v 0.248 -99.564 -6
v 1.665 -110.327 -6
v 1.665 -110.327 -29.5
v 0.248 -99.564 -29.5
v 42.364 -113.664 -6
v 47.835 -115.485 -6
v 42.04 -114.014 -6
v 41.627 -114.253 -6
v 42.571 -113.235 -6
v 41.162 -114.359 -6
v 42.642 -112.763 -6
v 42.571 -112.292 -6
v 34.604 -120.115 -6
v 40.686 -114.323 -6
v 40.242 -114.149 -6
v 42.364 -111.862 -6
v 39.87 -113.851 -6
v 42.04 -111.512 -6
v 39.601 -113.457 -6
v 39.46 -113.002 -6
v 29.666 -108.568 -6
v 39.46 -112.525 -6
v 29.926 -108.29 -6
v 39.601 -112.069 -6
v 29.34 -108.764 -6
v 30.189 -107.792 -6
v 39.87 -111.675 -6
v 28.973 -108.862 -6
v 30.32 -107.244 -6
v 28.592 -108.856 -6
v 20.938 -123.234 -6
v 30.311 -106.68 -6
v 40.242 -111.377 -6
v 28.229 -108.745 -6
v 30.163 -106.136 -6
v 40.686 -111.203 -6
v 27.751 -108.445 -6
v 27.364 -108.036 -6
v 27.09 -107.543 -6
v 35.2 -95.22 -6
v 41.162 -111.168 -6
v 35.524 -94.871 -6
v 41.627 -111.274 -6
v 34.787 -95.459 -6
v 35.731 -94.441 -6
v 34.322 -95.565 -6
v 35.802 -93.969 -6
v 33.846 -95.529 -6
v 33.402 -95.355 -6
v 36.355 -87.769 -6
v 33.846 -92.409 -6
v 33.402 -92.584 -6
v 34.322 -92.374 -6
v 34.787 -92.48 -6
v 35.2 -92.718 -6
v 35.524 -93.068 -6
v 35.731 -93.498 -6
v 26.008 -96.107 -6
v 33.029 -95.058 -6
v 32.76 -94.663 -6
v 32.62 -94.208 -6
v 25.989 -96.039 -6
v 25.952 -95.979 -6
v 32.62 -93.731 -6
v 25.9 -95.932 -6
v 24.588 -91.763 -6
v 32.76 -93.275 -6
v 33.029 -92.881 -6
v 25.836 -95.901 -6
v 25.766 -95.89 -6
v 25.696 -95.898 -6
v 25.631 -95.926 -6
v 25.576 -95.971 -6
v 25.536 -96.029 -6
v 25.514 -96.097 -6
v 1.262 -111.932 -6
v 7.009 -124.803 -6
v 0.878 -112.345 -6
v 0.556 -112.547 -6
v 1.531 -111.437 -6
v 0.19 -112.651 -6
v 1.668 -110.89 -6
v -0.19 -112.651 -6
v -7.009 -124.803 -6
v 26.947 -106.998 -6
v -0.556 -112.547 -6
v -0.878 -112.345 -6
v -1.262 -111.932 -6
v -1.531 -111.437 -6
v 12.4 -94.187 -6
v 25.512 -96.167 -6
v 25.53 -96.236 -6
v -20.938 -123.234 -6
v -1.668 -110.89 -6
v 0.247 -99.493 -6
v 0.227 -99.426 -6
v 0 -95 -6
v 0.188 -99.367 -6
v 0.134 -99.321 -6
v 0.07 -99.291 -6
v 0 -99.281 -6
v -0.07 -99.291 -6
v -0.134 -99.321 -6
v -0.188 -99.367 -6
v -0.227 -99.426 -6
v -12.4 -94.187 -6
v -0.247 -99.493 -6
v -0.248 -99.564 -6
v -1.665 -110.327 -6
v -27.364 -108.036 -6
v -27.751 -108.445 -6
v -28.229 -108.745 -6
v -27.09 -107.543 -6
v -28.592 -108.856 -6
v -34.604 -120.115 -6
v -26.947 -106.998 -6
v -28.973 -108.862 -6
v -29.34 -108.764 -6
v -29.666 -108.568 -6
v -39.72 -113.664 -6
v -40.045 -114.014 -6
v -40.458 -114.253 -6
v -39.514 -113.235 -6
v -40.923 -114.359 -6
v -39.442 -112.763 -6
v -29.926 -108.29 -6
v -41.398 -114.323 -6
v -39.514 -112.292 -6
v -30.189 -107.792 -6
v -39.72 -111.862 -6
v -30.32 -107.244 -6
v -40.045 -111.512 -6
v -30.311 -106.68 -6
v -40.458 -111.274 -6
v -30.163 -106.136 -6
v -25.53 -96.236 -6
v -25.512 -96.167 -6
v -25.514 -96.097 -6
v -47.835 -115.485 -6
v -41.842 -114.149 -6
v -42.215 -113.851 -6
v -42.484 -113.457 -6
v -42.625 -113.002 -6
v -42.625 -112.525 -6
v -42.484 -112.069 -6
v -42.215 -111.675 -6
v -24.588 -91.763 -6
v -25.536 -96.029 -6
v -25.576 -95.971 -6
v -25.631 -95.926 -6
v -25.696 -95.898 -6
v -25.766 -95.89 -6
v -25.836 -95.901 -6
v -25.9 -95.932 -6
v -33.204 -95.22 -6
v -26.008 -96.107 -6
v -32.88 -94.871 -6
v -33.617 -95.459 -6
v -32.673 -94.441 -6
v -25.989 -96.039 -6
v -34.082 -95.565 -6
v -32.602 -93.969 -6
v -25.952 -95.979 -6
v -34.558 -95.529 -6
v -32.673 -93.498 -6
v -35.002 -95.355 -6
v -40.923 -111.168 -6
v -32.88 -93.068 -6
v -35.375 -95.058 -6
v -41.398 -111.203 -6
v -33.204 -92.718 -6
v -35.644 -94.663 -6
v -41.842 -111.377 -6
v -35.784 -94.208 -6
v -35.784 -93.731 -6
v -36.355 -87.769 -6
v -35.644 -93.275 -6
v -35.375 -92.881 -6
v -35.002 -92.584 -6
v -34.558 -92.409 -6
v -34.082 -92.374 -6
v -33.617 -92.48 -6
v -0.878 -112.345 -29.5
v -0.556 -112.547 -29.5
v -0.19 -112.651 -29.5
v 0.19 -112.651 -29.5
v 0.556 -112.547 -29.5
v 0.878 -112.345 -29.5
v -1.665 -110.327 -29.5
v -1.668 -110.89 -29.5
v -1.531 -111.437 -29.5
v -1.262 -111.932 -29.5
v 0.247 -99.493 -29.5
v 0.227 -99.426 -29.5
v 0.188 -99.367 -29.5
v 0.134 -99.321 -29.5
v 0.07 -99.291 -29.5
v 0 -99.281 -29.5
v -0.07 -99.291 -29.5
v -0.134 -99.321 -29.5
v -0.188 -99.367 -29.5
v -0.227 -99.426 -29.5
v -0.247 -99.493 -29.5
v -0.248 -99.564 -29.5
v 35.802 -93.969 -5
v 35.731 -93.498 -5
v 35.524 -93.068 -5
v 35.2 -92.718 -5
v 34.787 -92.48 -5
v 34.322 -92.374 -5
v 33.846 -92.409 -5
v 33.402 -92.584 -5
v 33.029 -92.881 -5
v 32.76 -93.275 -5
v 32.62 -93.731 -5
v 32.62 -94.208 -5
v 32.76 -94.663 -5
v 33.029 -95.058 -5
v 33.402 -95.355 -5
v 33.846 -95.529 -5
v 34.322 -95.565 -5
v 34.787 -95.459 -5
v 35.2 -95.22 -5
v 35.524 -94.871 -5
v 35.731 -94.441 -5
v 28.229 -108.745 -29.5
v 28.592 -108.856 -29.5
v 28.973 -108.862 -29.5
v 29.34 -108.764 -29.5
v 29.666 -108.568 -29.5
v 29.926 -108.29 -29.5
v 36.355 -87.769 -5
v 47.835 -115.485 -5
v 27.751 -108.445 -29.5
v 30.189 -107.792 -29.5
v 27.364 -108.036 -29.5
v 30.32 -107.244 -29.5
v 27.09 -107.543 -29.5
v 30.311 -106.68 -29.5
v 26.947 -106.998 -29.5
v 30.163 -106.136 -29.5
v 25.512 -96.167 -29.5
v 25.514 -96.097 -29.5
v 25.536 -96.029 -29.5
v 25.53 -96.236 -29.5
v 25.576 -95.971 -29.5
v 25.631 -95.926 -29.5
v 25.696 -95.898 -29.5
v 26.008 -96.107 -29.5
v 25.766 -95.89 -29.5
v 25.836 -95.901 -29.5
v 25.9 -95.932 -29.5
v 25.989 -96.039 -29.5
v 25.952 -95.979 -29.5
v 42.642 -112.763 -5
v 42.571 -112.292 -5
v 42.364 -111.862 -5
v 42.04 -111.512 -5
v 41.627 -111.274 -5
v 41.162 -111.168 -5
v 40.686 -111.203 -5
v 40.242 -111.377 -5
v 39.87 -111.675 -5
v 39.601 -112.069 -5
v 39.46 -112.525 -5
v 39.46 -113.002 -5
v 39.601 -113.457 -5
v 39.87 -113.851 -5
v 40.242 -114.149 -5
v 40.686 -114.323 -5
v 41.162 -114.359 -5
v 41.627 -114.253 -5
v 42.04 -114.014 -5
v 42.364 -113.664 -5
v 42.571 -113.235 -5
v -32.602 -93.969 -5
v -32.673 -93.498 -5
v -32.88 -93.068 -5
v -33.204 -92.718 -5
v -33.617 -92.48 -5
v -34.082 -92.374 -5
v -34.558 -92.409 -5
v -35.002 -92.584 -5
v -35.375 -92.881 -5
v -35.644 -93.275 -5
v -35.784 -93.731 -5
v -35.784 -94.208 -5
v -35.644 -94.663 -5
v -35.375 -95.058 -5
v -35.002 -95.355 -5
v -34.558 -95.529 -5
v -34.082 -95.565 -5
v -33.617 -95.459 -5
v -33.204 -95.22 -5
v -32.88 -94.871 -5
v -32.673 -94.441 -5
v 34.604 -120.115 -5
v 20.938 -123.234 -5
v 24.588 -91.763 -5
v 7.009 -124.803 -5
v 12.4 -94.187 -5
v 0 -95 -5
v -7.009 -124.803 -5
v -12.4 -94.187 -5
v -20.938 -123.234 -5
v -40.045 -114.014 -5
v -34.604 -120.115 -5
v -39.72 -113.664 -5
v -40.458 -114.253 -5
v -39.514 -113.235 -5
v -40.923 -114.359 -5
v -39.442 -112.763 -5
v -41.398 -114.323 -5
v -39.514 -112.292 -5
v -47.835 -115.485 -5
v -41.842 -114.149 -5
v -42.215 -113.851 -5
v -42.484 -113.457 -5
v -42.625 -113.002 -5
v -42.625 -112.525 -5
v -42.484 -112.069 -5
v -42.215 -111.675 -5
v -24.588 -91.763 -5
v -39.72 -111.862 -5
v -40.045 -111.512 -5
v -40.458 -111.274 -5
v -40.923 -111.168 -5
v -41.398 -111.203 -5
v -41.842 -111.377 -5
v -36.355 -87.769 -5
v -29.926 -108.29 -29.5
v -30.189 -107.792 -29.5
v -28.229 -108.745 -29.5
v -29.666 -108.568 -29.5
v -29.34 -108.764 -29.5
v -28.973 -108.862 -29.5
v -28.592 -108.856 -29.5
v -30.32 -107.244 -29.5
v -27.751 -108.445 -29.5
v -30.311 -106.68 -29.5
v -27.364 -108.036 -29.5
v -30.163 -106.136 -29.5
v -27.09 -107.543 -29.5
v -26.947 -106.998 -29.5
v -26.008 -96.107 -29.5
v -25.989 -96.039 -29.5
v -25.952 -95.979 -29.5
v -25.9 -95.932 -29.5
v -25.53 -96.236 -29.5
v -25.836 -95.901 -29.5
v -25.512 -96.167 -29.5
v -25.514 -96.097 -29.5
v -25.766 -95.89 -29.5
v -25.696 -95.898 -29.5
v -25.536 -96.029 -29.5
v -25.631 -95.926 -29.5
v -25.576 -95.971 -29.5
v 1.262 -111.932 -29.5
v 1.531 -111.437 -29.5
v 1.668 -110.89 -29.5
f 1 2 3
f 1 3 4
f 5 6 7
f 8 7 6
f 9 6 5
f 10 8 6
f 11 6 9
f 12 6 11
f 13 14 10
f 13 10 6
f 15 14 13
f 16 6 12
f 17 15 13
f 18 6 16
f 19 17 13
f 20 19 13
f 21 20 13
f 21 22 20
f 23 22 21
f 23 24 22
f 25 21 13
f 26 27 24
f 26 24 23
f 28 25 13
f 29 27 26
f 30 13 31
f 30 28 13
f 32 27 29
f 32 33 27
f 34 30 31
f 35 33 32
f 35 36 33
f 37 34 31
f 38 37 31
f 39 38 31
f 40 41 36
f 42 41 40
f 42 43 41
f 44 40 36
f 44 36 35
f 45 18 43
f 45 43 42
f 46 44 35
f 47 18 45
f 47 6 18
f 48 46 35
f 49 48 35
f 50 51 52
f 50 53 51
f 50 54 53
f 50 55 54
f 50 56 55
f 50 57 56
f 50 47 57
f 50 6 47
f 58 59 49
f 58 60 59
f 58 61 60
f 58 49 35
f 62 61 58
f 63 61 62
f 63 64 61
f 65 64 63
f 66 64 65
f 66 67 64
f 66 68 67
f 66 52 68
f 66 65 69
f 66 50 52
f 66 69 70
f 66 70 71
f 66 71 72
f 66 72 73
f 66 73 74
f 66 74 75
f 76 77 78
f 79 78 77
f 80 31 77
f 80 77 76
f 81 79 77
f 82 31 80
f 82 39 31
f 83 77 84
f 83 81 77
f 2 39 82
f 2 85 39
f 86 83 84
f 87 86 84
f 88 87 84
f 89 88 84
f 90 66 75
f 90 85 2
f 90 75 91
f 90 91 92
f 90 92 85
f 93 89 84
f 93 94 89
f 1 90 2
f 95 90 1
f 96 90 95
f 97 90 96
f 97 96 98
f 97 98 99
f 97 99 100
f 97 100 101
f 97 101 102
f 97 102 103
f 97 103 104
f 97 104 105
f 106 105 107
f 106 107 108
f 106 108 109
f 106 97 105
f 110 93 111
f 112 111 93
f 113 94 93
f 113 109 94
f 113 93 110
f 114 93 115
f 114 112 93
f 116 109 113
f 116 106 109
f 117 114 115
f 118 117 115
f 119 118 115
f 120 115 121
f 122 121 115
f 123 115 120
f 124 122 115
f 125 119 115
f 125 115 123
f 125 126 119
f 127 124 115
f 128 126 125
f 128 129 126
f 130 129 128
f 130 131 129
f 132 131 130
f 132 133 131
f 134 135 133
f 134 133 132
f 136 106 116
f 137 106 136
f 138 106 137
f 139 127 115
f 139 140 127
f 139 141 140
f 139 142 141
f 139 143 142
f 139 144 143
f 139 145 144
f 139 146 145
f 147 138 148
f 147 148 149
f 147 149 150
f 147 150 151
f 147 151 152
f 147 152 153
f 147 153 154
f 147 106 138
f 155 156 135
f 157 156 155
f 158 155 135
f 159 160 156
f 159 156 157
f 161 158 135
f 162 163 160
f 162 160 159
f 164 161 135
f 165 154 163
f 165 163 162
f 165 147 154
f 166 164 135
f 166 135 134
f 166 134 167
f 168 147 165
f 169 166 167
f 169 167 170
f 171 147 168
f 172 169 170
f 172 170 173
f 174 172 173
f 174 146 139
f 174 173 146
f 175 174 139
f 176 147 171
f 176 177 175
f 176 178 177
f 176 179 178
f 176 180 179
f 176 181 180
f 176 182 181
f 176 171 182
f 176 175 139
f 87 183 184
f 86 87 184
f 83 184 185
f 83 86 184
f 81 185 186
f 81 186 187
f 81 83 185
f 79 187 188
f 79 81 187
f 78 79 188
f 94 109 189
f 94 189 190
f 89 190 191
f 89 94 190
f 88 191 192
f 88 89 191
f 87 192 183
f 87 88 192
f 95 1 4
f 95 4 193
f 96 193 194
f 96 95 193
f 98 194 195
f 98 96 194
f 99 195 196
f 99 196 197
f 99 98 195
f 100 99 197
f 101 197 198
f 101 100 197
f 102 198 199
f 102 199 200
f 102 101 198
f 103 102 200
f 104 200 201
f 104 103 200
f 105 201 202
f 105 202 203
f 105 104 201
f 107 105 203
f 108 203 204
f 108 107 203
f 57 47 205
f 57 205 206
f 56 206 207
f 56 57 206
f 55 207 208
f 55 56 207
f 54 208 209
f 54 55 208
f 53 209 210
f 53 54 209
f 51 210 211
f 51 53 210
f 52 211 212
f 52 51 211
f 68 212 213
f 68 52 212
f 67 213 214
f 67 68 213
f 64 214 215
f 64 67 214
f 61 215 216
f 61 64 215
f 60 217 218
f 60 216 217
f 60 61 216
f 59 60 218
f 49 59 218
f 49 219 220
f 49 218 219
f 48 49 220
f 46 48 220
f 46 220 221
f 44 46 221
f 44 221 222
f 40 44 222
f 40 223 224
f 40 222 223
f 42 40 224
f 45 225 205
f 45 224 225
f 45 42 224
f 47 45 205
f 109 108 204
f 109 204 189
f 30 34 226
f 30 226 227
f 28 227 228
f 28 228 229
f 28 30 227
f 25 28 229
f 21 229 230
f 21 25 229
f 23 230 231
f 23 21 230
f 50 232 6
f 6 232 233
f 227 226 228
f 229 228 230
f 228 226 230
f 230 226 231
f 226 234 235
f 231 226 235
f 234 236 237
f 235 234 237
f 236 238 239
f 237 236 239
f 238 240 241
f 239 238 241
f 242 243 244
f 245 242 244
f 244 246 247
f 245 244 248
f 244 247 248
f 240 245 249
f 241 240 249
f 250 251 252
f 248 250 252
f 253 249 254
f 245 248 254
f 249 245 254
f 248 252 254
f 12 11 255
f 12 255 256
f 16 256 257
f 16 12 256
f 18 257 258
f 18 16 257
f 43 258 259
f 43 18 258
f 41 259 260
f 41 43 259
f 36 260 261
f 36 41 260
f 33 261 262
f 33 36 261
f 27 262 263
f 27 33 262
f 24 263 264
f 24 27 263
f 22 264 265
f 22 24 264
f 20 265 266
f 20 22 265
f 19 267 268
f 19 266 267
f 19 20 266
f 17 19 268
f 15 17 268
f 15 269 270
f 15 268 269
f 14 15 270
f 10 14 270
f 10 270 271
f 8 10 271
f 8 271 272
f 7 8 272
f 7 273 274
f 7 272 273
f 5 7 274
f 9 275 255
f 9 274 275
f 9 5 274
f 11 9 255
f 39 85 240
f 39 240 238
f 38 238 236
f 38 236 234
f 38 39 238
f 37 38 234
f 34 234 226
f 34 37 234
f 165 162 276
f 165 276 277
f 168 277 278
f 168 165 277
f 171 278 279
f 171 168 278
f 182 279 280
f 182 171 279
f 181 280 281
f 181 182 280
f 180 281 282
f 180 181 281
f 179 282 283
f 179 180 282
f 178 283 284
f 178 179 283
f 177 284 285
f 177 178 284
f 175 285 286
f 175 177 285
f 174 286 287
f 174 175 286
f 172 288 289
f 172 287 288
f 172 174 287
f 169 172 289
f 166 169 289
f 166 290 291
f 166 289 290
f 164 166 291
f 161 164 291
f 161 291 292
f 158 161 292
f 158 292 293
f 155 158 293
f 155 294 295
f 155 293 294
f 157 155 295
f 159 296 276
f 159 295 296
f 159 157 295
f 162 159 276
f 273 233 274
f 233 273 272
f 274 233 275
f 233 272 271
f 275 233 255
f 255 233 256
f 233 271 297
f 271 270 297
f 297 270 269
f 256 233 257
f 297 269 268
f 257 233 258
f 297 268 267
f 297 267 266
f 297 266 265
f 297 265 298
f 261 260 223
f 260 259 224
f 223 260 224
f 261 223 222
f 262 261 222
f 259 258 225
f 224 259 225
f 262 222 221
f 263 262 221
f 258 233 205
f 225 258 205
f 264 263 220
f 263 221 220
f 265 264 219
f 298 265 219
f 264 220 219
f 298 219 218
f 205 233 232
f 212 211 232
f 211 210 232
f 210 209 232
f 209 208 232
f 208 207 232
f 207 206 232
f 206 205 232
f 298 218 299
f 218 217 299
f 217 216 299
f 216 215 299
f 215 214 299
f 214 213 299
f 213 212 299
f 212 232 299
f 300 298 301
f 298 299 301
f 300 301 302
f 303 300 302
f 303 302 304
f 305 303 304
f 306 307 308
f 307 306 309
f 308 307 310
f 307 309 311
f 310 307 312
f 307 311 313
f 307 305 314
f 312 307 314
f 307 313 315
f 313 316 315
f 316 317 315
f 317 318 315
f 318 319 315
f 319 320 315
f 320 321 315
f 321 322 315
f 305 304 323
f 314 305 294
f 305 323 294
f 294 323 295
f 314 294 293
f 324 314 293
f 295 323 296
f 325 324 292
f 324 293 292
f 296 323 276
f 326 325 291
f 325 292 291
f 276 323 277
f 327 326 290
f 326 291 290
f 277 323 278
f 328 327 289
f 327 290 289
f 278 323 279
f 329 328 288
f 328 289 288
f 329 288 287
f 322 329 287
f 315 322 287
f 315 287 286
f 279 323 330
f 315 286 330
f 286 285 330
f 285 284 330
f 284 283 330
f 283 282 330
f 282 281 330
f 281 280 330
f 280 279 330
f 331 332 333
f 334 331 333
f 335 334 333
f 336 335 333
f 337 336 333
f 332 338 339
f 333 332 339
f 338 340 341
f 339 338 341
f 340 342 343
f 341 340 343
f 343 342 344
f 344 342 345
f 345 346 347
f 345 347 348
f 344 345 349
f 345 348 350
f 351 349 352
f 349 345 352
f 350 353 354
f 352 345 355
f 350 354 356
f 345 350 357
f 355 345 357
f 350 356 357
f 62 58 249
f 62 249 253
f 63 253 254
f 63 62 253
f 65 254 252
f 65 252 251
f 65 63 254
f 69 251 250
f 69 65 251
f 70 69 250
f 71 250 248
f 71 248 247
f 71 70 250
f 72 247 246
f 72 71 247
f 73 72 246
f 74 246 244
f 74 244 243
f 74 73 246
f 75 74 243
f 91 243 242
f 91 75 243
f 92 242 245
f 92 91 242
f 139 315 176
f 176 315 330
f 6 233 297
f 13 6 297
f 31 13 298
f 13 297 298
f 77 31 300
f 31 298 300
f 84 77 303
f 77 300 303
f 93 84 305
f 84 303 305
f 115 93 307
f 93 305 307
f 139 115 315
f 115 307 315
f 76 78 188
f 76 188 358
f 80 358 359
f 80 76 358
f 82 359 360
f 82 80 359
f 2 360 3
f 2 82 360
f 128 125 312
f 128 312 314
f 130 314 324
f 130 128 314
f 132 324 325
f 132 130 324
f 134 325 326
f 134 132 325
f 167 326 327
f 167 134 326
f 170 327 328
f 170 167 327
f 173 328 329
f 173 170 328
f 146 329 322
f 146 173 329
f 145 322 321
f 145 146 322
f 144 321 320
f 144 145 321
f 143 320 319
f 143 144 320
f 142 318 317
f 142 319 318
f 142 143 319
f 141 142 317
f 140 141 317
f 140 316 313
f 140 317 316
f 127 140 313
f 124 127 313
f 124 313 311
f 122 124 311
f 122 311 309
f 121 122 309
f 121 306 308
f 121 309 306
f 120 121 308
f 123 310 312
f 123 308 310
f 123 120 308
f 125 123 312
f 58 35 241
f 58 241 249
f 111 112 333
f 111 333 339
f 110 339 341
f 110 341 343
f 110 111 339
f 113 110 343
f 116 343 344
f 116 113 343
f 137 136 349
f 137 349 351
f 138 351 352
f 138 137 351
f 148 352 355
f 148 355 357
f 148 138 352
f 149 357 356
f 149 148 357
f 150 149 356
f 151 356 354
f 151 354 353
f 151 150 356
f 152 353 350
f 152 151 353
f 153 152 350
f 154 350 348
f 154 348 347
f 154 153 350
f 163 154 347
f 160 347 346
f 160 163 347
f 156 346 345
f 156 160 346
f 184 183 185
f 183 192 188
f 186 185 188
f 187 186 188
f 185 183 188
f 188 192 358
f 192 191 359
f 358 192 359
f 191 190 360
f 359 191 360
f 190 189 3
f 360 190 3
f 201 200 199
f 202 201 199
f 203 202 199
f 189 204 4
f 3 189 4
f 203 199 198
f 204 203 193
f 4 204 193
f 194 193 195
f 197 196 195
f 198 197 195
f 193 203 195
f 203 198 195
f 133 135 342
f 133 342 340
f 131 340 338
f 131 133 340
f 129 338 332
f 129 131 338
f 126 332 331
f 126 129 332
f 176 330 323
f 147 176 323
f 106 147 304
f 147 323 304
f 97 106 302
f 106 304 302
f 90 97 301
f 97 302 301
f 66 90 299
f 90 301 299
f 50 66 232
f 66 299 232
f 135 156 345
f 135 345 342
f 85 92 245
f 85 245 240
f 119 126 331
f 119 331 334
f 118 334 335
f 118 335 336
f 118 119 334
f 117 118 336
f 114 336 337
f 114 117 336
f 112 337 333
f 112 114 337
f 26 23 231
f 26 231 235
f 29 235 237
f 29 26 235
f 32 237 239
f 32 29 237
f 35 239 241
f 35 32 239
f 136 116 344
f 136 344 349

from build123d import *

# Parameters (mm, degrees)
BOSS_EXTRUDE1_START      = -5
BOSS_EXTRUDE1_DEPTH      = 1
BOSS_EXTRUDE2_START      = -5
BOSS_EXTRUDE2_DEPTH      = 5
BOSS_EXTRUDE3_DEPTH      = 1
BOSS_EXTRUDE3_DEPTH_BACK = 6
BOSS_EXTRUDE4_DEPTH      = 23.5
CUT_EXTRUDE1_START       = -6
CUT_EXTRUDE1_DEPTH       = 6
CUT_EXTRUDE2_DEPTH       = 137.064243179
CUT_EXTRUDE2_DEPTH_BACK  = 137.064243179
SKETCH5_R                = 1.6


with BuildPart() as part:
    # Sketch1 → Boss-Extrude1 (new body)
    with BuildSketch(Plane.XY.offset(BOSS_EXTRUDE1_START)):
        with BuildLine():
            Line((-47.835429046, -115.484941564), (-36.354926075, -87.768555589))
            ThreePointArc((-36.354926075, -87.768555589), (0, -95), (36.354926075, -87.768555589))
            Line((36.354926075, -87.768555589), (47.835429046, -115.484941564))
            ThreePointArc((47.835429046, -115.484941564), (0, -125), (-47.835429046, -115.484941564))
        make_face()
        with BuildLine():
            Line((-26.038476963, -106.101650399), (-23.955923749, -97.86049365))
            ThreePointArc((-23.955923749, -97.86049365), (0, -100.75), (23.955923749, -97.86049365))
            Line((23.955923749, -97.86049365), (26.038476963, -106.101650399))
            ThreePointArc((26.038476963, -106.101650399), (0, -109.25), (-26.038476963, -106.101650399))
        make_face(mode=Mode.SUBTRACT)
    extrude(amount=-BOSS_EXTRUDE1_DEPTH)



with BuildPart() as body_2:
    # Sketch1<3> → Boss-Extrude2 (new body)
    with BuildSketch(Plane.XY.offset(BOSS_EXTRUDE2_START)):
        with BuildLine():
            ThreePointArc((-23.955923749, -97.86049365), (0, -100.75), (23.955923749, -97.86049365))
            Line((23.955923749, -97.86049365), (26.038476963, -106.101650399))
            ThreePointArc((26.038476963, -106.101650399), (0, -109.25), (-26.038476963, -106.101650399))
            Line((-26.038476963, -106.101650399), (-23.955923749, -97.86049365))
        make_face()
    extrude(amount=BOSS_EXTRUDE2_DEPTH)


with BuildPart() as part_1:
    add(part.part)

    add(body_2.part)  # Boss-Extrude3 merges body 2
    # Sketch1<4> → Boss-Extrude3 (add, two sides: drawn at the far end of the back side and taken through both)
    with BuildSketch(Plane.XY.offset(-BOSS_EXTRUDE3_DEPTH_BACK)):
        with BuildLine():
            ThreePointArc((-23.955923749, -97.86049365), (0, -100.75), (23.955923749, -97.86049365))
            Line((23.955923749, -97.86049365), (26.038476963, -106.101650399))
            ThreePointArc((26.038476963, -106.101650399), (0, -109.25), (-26.038476963, -106.101650399))
            Line((-26.038476963, -106.101650399), (-23.955923749, -97.86049365))
        make_face()
    extrude(amount=BOSS_EXTRUDE3_DEPTH + BOSS_EXTRUDE3_DEPTH_BACK)

    # Sketch3 → Boss-Extrude4 (add)
    with BuildSketch(Plane(origin=(0, 0, -6), x_dir=(-1, 0, 0), z_dir=(0, 0, -1))):
        with BuildLine():
            Line((-25.529686705, -96.235678696), (-26.946588628, -106.998117309))
            ThreePointArc((-26.946588628, -106.998117309), (-27.363549694, -108.035848526), (-28.228626172, -108.744639958))
            ThreePointArc((-28.228626172, -108.744639958), (-29.159731718, -108.825600307), (-29.9256126, -108.289933815))
            ThreePointArc((-29.9256126, -108.289933815), (-30.32039509, -107.24356419), (-30.162628357, -106.136382061))
            Line((-30.162628357, -106.136382061), (-26.008482111, -96.107385854))
            ThreePointArc((-26.008482111, -96.107385854), (-25.695897738, -95.898395904), (-25.529686705, -96.235678696))
        make_face()
        with BuildLine():
            Line((0.24784274, -99.564096598), (1.664744663, -110.326535211))
            ThreePointArc((1.664744663, -110.326535211), (1.530575804, -111.436824058), (0.878424814, -112.345362277))
            ThreePointArc((0.878424814, -112.345362277), (0, -112.664551817), (-0.878424814, -112.345362277))
            ThreePointArc((-0.878424814, -112.345362277), (-1.530575804, -111.436824058), (-1.664744663, -110.326535211))
            Line((-1.664744663, -110.326535211), (-0.24784274, -99.564096598))
            ThreePointArc((-0.24784274, -99.564096598), (0, -99.281325019), (0.24784274, -99.564096598))
        make_face()
        with BuildLine():
            Line((26.008482111, -96.107385854), (30.162628357, -106.136382061))
            ThreePointArc((30.162628357, -106.136382061), (30.32039509, -107.24356419), (29.9256126, -108.289933815))
            ThreePointArc((29.9256126, -108.289933815), (29.159731718, -108.825600307), (28.228626172, -108.744639958))
            ThreePointArc((28.228626172, -108.744639958), (27.363549694, -108.035848526), (26.946588628, -106.998117309))
            Line((26.946588628, -106.998117309), (25.529686705, -96.235678696))
            ThreePointArc((25.529686705, -96.235678696), (25.695897738, -95.898395904), (26.008482111, -96.107385854))
        make_face()
    extrude(amount=BOSS_EXTRUDE4_DEPTH)

    # Sketch4 → Cut-Extrude1 (cut)
    with BuildSketch(Plane.XY.offset(1).offset(CUT_EXTRUDE1_START)):
        with BuildLine():
            Line((-23.955923749, -97.86049365), (-26.038476963, -106.101650399))
            ThreePointArc((-26.038476963, -106.101650399), (0, -109.25), (26.038476963, -106.101650399))
            Line((26.038476963, -106.101650399), (23.955923749, -97.86049365))
            ThreePointArc((23.955923749, -97.86049365), (0, -100.75), (-23.955923749, -97.86049365))
        make_face()
    extrude(amount=CUT_EXTRUDE1_DEPTH, mode=Mode.SUBTRACT)

    # Sketch5 → Cut-Extrude2 (cut, two sides: drawn at the far end of the back side and taken through both)
    with BuildSketch(Plane.XY.offset(-5).offset(-CUT_EXTRUDE2_DEPTH_BACK)):
        with Locations((-34.202014333, -93.969262079)):
            Circle(SKETCH5_R)
        with Locations((-41.042417199, -112.763114494)):
            Circle(SKETCH5_R)
        with Locations((41.042417199, -112.763114494)):
            Circle(SKETCH5_R)
        with Locations((34.202014333, -93.969262079)):
            Circle(SKETCH5_R)
    extrude(amount=CUT_EXTRUDE2_DEPTH + CUT_EXTRUDE2_DEPTH_BACK, mode=Mode.SUBTRACT)


solid = part_1.part
